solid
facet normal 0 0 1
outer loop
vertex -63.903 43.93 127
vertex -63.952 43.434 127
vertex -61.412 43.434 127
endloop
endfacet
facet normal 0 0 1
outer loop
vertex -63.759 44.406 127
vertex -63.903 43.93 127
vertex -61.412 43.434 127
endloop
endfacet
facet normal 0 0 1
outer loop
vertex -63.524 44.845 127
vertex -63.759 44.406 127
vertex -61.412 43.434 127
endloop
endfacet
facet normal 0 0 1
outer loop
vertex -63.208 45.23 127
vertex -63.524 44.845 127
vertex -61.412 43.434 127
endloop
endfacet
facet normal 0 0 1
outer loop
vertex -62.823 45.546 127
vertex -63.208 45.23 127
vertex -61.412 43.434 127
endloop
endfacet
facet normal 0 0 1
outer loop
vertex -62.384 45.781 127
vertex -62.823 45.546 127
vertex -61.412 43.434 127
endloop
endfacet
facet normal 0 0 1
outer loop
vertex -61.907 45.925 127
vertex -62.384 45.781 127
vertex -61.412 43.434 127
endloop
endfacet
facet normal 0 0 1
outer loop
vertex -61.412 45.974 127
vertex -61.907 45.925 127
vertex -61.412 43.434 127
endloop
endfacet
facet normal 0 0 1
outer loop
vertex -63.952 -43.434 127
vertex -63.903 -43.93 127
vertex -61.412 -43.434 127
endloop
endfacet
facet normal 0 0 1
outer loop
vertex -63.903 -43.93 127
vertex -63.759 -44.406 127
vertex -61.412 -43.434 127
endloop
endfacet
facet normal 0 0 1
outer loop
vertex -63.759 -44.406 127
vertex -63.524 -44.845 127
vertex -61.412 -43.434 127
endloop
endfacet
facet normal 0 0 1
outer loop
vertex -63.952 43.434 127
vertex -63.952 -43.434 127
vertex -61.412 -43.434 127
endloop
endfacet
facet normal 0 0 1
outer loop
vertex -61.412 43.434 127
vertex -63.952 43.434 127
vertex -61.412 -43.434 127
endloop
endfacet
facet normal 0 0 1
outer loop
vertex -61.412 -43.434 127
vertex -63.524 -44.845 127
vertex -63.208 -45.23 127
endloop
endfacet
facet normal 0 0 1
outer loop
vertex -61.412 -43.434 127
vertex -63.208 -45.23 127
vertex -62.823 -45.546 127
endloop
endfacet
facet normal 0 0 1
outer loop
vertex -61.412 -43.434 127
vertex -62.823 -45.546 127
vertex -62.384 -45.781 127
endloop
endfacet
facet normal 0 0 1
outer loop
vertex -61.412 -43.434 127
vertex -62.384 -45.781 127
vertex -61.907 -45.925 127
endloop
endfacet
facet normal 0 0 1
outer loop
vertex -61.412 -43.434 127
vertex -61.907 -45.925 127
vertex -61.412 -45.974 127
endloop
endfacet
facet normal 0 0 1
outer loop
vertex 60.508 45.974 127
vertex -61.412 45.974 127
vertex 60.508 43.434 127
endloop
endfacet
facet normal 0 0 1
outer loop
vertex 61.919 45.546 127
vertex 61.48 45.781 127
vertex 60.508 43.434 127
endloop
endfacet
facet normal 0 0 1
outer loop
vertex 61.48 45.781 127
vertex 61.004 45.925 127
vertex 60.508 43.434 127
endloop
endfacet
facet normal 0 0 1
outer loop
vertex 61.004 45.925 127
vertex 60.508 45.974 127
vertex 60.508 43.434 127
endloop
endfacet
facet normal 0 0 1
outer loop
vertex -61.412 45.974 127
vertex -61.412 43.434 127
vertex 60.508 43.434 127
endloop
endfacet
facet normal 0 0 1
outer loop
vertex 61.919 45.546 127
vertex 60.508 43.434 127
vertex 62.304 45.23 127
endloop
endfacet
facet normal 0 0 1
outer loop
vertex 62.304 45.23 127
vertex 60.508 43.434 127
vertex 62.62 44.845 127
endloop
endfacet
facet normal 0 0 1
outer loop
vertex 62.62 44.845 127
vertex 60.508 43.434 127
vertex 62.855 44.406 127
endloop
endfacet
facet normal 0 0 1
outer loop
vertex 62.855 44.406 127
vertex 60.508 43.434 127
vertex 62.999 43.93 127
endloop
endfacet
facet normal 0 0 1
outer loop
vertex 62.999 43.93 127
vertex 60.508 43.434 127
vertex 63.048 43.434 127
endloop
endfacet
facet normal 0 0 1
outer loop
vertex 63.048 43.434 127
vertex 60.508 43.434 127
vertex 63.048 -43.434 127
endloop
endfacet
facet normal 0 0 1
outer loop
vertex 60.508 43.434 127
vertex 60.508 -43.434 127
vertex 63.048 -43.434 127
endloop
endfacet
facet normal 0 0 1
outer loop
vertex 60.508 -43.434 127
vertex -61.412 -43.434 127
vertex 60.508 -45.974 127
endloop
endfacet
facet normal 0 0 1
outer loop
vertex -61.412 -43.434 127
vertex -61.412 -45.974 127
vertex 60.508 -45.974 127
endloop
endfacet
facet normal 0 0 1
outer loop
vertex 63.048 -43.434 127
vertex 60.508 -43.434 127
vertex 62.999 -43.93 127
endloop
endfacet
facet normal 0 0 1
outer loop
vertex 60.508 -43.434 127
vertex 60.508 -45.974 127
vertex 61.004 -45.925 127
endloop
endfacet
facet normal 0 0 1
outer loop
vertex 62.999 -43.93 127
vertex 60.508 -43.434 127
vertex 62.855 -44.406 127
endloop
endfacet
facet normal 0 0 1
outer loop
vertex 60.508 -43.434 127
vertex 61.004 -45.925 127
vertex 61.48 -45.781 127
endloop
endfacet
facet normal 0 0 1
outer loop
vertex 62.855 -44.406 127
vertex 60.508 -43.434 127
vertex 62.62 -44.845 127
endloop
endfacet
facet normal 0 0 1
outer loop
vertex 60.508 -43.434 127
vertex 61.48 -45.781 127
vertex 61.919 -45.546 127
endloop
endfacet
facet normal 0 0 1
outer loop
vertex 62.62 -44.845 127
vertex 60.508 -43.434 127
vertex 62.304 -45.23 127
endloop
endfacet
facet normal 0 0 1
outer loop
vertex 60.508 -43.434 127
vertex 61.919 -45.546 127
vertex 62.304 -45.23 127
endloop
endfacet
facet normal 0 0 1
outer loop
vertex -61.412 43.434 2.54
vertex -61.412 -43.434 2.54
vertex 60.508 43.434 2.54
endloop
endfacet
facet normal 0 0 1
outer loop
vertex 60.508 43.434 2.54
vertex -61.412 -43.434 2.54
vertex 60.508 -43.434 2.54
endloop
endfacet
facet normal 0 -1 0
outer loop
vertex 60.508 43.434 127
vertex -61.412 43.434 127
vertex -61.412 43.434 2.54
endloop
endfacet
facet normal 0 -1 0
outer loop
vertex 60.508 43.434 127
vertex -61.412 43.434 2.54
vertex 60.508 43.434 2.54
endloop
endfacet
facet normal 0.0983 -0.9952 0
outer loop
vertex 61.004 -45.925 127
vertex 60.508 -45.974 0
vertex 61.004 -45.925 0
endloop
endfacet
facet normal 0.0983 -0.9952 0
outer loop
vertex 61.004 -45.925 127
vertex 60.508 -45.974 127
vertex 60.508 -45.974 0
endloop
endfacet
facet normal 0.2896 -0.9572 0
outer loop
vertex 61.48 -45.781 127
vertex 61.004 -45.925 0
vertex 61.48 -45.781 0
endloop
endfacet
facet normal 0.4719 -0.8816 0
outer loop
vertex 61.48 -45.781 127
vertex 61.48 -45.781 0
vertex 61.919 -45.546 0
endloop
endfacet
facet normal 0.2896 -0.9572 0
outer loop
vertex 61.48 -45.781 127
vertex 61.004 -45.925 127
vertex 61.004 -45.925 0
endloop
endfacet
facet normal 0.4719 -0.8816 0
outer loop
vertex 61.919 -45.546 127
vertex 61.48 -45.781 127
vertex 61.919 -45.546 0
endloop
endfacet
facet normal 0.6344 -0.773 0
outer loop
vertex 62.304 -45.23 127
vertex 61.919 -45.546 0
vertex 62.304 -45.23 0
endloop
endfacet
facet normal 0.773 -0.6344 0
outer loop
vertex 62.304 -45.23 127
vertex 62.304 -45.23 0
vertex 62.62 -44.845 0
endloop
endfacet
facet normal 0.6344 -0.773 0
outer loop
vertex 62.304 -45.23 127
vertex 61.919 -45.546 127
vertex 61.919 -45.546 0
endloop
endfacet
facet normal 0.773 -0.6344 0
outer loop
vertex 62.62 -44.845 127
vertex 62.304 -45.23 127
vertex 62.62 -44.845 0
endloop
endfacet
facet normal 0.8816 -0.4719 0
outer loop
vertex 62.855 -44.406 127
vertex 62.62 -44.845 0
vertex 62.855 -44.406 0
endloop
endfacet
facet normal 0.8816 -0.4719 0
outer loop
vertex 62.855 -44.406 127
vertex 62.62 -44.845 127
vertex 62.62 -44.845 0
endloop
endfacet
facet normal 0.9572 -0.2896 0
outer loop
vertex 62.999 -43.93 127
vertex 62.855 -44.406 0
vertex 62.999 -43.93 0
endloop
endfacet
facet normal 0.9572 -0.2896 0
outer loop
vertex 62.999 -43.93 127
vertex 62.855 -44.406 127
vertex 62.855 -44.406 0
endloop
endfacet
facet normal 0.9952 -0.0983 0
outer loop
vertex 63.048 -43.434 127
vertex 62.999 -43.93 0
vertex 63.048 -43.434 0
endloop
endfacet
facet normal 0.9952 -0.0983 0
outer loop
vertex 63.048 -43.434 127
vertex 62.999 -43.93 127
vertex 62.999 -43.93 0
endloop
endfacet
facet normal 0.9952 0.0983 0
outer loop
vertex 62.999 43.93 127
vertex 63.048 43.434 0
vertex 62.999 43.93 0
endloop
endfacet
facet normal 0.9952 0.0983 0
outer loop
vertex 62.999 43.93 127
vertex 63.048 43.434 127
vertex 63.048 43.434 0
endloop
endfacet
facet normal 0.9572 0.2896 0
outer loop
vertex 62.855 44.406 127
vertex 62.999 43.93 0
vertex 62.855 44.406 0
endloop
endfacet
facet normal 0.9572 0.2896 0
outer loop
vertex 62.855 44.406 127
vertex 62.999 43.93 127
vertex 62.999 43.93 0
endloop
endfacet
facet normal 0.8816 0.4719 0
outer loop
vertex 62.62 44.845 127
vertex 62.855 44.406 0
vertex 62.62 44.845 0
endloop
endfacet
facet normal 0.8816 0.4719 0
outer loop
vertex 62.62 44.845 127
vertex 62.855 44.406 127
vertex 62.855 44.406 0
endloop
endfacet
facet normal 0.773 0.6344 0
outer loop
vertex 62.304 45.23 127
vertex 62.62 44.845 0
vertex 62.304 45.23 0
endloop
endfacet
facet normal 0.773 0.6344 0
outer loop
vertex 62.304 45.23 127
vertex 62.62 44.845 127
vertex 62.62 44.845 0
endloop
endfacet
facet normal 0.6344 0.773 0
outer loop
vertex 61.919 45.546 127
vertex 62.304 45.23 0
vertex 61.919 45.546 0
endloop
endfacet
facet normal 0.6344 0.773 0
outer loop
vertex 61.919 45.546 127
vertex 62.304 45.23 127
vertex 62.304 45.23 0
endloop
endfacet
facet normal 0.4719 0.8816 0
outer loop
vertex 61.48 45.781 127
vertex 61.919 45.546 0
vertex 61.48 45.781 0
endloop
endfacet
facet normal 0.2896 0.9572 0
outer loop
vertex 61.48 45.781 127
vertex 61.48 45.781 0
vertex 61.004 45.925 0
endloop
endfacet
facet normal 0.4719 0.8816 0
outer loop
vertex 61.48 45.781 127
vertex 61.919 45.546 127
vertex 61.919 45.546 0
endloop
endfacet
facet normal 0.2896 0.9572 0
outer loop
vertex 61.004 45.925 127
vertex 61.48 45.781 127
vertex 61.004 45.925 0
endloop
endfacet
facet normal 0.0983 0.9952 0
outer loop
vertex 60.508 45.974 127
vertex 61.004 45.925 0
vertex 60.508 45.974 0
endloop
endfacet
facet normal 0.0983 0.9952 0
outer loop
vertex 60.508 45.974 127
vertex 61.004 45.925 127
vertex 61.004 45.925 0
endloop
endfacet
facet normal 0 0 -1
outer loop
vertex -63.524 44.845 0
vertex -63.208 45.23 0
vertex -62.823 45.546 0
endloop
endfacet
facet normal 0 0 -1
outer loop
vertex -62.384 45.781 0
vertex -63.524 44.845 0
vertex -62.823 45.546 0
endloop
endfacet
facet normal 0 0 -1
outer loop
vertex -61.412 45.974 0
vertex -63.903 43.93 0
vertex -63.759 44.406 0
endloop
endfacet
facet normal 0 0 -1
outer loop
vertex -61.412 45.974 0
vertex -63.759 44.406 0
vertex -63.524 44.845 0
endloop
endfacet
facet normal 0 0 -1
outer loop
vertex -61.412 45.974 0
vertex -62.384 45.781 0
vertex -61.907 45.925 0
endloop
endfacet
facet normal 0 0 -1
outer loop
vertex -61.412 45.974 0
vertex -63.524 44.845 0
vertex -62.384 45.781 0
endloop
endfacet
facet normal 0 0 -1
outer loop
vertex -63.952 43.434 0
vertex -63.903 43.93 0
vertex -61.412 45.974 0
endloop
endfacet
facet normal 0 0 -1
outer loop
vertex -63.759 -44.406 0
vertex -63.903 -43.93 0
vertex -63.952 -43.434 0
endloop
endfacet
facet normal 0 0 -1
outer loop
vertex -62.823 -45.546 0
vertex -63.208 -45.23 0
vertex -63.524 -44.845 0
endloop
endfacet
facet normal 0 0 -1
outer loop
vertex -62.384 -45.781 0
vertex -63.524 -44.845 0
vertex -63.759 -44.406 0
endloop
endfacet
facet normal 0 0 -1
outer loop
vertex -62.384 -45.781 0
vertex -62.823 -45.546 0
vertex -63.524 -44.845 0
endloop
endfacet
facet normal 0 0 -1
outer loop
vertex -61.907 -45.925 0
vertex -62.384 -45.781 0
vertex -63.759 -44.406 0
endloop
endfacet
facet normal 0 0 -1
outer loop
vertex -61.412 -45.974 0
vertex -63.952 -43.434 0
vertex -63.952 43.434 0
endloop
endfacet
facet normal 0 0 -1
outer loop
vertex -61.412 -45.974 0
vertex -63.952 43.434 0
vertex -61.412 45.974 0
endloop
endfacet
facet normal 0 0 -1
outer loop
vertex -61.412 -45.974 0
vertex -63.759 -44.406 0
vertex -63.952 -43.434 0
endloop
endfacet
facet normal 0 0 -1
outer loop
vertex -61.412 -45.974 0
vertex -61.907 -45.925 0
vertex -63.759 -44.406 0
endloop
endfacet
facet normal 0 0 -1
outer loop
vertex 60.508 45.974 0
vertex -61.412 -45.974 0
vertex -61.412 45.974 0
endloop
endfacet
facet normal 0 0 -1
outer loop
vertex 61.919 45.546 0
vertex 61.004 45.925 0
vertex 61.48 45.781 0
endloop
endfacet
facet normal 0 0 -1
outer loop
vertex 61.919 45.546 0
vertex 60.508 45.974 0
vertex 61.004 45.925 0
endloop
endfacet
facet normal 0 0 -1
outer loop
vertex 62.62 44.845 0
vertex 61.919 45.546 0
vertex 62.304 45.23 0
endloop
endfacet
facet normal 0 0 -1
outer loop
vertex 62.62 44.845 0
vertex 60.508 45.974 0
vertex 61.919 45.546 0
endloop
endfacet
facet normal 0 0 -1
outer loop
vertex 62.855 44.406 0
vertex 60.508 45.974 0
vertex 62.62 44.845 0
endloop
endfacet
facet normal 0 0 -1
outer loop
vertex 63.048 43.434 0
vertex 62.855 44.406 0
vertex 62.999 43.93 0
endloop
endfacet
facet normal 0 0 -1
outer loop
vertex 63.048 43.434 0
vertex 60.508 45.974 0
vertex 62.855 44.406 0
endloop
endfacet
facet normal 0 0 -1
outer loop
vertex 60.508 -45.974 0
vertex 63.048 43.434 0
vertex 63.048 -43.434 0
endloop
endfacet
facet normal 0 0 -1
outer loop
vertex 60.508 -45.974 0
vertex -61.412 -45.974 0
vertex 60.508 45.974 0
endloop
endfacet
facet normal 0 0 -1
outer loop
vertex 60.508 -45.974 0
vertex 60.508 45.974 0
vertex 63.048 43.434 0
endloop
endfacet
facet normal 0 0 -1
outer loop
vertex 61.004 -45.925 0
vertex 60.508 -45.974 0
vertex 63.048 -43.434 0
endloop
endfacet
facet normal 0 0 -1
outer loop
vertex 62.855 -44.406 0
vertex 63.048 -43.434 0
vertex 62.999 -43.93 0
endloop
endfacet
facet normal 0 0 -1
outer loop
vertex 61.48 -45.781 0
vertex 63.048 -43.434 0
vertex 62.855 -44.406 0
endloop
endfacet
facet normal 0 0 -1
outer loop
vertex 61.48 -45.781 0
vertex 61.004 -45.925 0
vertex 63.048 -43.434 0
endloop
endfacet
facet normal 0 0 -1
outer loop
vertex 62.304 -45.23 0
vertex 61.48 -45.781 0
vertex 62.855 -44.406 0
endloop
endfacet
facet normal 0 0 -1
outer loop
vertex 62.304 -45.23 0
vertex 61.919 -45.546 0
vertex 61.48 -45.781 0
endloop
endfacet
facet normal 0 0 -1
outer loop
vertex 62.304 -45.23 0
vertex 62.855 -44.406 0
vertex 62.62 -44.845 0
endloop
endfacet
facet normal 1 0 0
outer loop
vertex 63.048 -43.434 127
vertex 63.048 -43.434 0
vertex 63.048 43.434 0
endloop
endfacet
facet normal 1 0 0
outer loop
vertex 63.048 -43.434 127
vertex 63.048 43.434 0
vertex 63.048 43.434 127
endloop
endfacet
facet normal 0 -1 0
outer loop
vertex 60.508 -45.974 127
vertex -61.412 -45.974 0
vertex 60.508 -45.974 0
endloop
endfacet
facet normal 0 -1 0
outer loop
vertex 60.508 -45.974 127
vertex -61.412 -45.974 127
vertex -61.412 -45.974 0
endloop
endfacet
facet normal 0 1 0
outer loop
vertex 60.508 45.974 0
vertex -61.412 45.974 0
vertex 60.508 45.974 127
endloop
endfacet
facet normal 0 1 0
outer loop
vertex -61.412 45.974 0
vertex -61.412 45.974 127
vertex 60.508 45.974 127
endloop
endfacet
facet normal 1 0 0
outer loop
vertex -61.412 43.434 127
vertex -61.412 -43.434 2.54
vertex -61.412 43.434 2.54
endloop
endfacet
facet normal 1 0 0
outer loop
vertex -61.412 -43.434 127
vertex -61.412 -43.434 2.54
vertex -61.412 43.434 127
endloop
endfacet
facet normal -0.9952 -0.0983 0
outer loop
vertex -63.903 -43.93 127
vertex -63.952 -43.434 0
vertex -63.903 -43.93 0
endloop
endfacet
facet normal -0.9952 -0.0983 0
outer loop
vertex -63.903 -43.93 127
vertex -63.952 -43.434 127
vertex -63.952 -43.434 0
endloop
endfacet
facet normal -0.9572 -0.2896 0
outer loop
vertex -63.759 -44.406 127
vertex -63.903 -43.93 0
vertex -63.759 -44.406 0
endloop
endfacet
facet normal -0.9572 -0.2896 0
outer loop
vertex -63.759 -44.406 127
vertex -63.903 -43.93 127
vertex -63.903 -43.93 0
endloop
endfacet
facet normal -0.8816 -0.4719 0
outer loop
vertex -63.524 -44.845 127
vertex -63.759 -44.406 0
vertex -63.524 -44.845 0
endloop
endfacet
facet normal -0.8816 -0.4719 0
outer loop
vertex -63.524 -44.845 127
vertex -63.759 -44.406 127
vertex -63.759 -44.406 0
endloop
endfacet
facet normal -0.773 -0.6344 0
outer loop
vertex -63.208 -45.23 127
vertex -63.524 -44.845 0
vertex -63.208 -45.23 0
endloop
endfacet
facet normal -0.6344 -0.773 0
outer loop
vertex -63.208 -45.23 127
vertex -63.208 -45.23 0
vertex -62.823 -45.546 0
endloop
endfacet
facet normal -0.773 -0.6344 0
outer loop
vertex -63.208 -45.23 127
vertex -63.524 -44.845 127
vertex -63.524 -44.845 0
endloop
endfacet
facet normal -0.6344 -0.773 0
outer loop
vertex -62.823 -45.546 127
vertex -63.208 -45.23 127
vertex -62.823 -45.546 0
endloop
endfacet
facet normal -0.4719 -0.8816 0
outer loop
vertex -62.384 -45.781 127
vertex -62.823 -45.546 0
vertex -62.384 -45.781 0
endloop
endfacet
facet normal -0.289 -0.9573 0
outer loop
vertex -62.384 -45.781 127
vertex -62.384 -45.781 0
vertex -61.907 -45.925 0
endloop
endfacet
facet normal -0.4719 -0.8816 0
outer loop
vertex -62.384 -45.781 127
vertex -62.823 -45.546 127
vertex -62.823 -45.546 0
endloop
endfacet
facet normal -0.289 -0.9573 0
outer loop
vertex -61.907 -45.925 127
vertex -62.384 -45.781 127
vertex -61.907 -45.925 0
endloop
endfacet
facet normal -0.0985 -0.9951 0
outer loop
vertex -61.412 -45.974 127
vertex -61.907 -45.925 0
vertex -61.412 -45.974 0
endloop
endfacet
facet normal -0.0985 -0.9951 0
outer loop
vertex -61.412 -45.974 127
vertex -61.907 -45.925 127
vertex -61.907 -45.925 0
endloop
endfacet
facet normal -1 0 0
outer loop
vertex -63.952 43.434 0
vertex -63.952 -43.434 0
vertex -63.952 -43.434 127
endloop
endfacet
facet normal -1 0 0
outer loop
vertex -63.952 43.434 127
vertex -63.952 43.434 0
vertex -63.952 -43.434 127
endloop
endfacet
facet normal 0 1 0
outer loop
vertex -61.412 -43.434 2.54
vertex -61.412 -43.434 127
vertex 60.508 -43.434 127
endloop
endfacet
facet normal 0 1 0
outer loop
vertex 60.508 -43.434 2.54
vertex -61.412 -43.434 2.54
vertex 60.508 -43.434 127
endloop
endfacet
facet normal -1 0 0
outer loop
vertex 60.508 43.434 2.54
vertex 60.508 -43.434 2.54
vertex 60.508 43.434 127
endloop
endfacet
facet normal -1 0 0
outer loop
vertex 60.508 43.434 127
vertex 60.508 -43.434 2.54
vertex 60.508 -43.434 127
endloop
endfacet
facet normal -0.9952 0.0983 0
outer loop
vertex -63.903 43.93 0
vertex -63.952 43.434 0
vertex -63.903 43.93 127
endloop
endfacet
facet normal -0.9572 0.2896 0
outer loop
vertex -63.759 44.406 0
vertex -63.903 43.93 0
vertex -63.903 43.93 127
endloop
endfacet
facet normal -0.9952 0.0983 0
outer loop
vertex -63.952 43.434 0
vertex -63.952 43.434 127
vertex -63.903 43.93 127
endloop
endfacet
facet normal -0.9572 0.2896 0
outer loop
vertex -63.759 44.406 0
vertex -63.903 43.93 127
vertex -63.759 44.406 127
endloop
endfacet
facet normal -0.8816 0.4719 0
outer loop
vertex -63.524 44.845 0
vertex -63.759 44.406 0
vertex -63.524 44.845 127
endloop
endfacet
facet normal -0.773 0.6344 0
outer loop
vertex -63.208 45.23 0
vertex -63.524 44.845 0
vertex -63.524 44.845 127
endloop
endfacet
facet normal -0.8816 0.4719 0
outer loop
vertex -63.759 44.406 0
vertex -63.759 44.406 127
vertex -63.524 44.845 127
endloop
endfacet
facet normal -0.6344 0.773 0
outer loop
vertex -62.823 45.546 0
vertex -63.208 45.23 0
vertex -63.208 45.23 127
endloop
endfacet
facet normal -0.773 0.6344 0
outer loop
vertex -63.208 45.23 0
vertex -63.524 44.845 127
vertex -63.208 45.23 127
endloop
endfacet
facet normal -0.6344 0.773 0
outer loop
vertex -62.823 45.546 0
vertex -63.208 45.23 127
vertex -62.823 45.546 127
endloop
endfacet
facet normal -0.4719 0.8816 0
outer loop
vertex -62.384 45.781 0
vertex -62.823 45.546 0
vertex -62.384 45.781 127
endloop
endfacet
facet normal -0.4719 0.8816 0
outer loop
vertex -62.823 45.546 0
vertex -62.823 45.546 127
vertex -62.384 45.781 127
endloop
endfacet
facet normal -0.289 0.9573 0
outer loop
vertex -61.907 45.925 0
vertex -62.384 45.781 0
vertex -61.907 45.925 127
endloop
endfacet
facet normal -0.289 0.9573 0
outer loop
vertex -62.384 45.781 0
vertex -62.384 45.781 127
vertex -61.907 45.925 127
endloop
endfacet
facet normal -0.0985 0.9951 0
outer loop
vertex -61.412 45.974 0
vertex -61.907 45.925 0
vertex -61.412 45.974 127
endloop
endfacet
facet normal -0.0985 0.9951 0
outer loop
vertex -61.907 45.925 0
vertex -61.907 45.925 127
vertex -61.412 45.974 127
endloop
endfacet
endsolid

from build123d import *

# Parameters (mm, degrees)
F0_W     = 127
F0_H     = 127
F1_DEPTH = 45.974
F2_R     = 2.54
F3_T     = 2.54


# Not quite as in the source:
# - a shell that OpenCascade refuses in one call is made with other operations: the cavity is built on its own and cut out


with BuildPart() as f1:
    # F0 (on Front) → F1 (new body, symmetric)
    with BuildSketch(Plane.XZ):
        with Locations((-0.4519568912, 63.5)):
            Rectangle(F0_W, F0_H)
    extrude(amount=F1_DEPTH, both=True)

    # F2
    f2_edges = [f1.edges().sort_by_distance(p)[0] for p in [
        (-63.951957, -45.974, 63.5),
        (63.048043, -45.974, 63.5),
        (63.048043, 45.974, 63.5),
        (-63.951957, 45.974, 63.5),
    ]]
    fillet(f2_edges, radius=F2_R)

    # F3: shell of thickness 2.54, made by hand


with BuildPart() as f3_core1:
    # F3_t2: copy of F1
    add(f1.part)

    # the walls: a layer under each face that stays
    f3_faces = [f3_core1.faces().sort_by_distance(p)[0] for p in [
        (-0.4519568912, 45.974, 63.5),
        (63.0480431088, 0, 63.5),
        (-63.9519568912, 0, 63.5),
        (-0.4519568912, -45.974, 63.5),
        (-0.4519568912, 0, 0),
    ]]
    thicken(f3_faces, amount=-F3_T, mode=Mode.SUBTRACT)


with BuildPart() as f1_1:
    add(f1.part)

    # what is left inside the walls is the cavity
    f3_cavity = [f3_core1.part.solids().sort_by_distance(p)[0] for p in [
        (-0.451957, -43.4086, 44.026667),
    ]]
    add(f3_cavity, mode=Mode.SUBTRACT)


solid = f1_1.part
